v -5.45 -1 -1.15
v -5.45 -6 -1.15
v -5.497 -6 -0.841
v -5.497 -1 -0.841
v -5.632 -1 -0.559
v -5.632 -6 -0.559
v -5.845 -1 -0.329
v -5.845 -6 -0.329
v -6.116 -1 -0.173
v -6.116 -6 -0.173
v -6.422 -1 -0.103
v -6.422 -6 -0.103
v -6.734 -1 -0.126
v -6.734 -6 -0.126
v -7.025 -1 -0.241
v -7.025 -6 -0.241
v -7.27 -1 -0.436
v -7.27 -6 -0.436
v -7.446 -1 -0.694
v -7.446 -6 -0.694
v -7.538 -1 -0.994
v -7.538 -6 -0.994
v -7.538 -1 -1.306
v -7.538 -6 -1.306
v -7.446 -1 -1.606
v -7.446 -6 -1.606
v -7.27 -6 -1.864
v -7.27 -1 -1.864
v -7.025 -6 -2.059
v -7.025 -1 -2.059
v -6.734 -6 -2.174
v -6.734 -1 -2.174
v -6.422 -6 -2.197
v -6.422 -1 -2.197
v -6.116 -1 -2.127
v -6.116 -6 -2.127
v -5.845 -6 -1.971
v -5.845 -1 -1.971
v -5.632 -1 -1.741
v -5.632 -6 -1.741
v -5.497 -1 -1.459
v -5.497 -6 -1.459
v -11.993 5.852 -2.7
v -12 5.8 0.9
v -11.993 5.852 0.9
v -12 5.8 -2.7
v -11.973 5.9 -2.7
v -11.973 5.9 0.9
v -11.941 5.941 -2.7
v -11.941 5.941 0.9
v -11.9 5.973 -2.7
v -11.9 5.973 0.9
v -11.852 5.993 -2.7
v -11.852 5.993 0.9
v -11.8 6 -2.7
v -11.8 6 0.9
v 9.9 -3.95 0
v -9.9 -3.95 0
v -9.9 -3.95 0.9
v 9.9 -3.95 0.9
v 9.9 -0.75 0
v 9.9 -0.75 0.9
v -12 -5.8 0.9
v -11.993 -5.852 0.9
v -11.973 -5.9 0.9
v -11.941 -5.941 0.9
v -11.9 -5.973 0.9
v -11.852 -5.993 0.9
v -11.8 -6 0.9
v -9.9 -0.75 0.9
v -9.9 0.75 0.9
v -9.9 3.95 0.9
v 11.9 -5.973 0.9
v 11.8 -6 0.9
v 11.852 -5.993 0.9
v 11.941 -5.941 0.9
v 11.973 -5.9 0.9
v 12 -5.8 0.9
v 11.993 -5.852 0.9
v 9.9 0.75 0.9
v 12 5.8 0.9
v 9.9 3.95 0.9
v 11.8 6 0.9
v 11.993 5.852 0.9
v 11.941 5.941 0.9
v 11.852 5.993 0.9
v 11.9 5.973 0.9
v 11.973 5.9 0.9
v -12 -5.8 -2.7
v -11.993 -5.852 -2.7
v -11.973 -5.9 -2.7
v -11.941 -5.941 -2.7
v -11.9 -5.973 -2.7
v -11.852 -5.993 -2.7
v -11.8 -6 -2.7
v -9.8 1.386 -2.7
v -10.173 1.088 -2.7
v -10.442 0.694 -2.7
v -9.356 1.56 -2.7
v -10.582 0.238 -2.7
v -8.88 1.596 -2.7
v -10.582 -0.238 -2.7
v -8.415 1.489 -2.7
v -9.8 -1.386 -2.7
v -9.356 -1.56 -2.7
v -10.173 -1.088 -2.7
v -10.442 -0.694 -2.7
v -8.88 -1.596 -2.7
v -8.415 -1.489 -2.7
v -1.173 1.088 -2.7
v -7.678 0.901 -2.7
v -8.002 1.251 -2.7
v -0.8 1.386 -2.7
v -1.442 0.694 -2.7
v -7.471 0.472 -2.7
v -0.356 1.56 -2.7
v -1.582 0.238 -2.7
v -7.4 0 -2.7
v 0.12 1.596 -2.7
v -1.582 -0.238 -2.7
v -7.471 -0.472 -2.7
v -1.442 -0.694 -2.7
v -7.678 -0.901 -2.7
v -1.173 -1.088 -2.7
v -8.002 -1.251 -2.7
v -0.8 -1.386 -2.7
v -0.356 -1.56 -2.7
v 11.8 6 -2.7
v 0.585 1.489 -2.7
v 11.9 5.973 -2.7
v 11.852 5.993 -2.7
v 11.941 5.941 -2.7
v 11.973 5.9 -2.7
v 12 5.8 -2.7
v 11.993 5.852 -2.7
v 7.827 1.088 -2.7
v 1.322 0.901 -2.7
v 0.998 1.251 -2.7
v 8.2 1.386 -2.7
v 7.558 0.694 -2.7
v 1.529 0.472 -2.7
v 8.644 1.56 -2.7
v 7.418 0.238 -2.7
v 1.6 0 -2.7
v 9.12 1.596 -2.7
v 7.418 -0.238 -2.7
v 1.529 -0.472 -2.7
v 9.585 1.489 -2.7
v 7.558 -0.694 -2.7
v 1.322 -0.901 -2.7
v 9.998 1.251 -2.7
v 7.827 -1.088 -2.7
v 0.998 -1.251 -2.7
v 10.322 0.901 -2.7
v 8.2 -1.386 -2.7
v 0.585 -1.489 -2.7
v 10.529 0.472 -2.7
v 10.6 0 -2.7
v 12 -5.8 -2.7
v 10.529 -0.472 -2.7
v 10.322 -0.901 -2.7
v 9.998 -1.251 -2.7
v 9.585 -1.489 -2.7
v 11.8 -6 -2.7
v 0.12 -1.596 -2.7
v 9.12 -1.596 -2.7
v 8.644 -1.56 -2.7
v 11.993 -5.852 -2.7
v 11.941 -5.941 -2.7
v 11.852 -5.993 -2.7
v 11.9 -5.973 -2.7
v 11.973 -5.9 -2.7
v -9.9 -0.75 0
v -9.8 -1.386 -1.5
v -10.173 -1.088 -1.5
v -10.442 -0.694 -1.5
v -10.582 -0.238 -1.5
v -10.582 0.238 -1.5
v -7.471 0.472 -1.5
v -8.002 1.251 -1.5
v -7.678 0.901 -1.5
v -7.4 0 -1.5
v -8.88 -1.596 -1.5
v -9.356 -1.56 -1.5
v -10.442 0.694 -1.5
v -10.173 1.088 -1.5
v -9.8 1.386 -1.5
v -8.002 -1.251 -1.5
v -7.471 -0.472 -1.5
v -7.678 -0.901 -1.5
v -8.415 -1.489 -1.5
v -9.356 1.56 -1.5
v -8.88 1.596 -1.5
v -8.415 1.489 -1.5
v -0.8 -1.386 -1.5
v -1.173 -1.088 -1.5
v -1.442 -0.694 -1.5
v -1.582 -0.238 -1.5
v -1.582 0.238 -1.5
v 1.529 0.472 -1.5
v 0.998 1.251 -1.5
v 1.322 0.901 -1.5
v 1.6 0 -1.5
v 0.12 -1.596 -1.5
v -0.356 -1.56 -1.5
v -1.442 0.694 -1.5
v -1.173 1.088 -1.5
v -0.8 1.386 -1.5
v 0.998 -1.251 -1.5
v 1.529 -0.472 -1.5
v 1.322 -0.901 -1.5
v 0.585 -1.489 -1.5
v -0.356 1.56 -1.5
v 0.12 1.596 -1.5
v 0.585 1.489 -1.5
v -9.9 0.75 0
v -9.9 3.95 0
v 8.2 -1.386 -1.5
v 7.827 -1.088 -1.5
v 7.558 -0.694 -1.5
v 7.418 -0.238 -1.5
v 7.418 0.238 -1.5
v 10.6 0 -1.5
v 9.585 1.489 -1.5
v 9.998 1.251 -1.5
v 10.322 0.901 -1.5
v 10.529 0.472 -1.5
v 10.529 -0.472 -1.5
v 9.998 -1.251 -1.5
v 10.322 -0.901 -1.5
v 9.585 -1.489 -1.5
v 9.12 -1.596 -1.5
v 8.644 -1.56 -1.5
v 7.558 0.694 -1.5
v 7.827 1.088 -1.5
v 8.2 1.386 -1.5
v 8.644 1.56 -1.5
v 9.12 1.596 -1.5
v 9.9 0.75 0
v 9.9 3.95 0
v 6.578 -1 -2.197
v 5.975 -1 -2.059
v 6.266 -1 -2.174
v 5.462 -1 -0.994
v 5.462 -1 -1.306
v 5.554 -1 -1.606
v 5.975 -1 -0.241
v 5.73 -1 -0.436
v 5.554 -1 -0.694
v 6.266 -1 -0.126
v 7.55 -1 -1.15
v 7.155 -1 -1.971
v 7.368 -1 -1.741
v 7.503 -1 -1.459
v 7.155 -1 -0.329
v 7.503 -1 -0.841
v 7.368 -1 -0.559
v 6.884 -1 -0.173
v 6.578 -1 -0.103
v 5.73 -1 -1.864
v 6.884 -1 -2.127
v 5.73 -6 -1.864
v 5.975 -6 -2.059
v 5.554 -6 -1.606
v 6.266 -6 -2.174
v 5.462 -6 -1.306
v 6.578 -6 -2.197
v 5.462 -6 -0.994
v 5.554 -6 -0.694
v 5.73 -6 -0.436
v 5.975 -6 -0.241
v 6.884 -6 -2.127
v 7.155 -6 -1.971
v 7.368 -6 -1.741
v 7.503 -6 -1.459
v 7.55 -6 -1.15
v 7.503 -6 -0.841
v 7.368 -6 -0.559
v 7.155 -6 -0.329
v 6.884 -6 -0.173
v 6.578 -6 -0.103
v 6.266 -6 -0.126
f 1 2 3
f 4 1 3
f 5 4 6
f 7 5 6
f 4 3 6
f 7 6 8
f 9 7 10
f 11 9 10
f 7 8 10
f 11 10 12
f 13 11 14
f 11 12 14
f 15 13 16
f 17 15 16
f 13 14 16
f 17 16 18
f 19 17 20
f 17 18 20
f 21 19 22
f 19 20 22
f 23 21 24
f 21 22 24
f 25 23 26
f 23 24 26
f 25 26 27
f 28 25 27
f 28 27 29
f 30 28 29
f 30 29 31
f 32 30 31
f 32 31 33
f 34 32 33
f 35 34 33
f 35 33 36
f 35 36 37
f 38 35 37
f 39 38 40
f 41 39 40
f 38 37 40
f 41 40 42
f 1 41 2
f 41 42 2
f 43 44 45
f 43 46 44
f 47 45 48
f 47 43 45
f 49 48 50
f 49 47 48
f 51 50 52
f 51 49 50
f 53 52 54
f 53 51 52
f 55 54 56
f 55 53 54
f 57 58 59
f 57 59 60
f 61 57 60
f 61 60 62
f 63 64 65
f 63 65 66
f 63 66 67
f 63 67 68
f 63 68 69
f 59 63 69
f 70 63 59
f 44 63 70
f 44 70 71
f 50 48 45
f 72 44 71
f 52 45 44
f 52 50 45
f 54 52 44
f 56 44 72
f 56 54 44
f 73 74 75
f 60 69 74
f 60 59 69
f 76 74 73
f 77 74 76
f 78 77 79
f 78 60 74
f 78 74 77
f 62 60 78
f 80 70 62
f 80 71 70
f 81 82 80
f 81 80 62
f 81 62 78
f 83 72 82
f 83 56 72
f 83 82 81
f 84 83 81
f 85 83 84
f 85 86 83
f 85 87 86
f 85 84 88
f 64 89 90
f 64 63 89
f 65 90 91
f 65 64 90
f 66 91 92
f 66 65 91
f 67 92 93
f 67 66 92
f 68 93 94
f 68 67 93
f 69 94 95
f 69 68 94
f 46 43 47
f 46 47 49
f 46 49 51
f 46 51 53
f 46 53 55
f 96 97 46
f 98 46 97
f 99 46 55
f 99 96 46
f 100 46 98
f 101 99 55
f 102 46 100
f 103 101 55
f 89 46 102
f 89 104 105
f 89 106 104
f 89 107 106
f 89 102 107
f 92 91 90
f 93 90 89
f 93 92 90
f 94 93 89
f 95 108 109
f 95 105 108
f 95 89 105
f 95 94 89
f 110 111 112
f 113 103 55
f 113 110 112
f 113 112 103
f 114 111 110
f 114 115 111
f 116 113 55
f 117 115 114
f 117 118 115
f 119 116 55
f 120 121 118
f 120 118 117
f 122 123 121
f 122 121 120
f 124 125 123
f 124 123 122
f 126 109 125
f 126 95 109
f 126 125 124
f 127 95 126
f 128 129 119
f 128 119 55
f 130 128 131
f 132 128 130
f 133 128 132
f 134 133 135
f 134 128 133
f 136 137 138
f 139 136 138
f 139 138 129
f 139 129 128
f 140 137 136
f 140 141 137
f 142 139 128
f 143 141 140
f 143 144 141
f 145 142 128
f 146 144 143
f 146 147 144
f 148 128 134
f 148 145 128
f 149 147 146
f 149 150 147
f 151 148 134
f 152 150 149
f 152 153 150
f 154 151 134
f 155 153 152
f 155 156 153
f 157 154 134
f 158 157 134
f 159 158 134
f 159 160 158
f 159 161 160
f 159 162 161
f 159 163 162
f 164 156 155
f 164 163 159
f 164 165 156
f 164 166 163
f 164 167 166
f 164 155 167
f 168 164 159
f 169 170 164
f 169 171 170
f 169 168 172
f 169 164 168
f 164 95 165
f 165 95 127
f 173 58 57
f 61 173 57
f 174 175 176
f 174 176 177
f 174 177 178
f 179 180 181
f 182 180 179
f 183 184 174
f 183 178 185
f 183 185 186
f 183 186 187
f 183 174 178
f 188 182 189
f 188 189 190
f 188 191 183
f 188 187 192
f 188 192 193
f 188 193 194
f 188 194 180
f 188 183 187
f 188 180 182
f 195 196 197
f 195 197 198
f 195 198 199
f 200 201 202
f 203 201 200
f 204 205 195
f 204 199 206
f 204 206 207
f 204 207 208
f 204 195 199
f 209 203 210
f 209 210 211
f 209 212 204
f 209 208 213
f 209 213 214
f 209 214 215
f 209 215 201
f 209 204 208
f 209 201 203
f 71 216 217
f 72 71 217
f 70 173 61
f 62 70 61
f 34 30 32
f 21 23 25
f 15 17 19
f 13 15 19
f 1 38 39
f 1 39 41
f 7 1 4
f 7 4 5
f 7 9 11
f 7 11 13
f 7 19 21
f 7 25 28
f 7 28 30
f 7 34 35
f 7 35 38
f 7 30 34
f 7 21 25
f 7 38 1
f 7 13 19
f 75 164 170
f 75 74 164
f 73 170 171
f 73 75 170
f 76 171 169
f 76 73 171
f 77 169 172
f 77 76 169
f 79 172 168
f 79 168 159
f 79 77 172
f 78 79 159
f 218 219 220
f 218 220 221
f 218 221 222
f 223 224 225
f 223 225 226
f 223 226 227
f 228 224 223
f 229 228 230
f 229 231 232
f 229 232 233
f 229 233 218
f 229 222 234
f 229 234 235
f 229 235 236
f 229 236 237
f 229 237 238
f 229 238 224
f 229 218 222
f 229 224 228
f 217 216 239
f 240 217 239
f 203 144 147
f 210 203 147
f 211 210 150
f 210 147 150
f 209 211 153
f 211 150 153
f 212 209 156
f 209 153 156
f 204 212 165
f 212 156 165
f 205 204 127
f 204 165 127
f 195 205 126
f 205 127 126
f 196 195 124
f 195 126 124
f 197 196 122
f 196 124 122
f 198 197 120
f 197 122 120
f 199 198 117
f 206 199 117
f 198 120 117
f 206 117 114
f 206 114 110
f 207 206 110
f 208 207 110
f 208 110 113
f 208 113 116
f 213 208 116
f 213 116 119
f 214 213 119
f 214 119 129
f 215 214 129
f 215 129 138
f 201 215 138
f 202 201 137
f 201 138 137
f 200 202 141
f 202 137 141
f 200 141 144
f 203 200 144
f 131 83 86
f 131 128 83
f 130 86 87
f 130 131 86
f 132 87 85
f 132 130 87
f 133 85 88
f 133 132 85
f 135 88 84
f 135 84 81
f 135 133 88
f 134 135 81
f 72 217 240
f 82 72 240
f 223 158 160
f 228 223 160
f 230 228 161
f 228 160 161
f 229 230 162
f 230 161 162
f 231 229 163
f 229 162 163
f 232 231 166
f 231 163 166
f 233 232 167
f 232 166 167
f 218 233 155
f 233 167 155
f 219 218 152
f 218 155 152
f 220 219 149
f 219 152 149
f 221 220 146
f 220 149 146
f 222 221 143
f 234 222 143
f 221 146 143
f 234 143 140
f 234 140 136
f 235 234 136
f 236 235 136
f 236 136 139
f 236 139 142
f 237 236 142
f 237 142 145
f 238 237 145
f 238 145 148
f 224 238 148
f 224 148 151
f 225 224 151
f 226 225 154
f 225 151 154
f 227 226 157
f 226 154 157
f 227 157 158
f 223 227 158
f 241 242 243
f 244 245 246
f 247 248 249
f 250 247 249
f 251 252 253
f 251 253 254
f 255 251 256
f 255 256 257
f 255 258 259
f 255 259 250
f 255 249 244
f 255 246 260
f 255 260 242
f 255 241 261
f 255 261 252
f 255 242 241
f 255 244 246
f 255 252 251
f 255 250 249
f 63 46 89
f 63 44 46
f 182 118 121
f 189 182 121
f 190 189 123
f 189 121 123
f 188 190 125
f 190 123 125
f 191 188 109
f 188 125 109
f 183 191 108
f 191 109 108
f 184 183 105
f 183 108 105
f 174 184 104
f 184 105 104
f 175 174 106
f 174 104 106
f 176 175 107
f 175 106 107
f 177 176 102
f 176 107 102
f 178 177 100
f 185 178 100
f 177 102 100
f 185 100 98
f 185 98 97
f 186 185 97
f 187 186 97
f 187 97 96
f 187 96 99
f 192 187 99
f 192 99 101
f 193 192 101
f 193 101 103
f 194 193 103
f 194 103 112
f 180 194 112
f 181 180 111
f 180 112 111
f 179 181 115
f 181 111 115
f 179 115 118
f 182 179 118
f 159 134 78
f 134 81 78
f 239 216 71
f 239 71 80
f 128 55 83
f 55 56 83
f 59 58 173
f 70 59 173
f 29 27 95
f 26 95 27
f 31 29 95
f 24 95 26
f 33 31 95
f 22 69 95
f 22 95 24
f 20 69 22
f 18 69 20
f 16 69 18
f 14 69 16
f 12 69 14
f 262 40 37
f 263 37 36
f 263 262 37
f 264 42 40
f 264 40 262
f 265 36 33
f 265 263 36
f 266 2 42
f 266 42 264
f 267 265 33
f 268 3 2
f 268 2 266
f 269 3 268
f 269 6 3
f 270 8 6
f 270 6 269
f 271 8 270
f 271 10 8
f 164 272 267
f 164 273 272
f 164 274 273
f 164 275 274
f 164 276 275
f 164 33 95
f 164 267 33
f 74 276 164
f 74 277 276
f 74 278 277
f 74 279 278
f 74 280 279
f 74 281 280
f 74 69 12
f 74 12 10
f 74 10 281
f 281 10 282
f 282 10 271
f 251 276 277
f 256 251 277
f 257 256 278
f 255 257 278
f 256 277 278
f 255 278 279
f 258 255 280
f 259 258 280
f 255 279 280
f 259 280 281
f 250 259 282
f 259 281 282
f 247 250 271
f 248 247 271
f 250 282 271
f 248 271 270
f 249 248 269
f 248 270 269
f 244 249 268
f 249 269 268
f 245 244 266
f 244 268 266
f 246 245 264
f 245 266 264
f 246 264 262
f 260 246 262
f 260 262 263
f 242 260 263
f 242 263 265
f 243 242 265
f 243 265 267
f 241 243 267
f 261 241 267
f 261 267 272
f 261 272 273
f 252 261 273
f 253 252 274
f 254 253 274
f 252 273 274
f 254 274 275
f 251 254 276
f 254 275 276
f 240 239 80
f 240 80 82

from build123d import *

# Parameters (mm, degrees)
F0_W     = 24
F0_H     = 12
F0_W_2   = 19.8
F0_H_2   = 3.2
F1_DEPTH = 0.9
F2_W     = 24
F2_H     = 12
F3_DEPTH = 2.7
F4_R     = 1.6
F5_DEPTH = 1.2
F6_R     = 0.2
F7_R     = 1.05
F8_DEPTH = 5


with BuildPart() as f1:
    # F0 (on Top) → F1 (new body)
    with BuildSketch(Plane.XY):
        Rectangle(F0_W, F0_H)
        with Locations((0, -2.35)):
            Rectangle(F0_W_2, F0_H_2, mode=Mode.SUBTRACT)
        with Locations((0, 2.35)):
            Rectangle(F0_W_2, F0_H_2, mode=Mode.SUBTRACT)
    extrude(amount=F1_DEPTH)

    # F2 (on face) → F3 (join)
    with BuildSketch(Plane(origin=(0, 0, 0), x_dir=(1, 0, 0), z_dir=(0, 0, -1))):
        Rectangle(F2_W, F2_H)
    extrude(amount=F3_DEPTH)

    # F4 (on face) → F5 (cut)
    with BuildSketch(Plane(origin=(0, 0, -2.7), x_dir=(1, 0, 0), z_dir=(0, 0, -1))):
        Circle(F4_R)
        with Locations((-9, 0)):
            Circle(F4_R)
        with Locations((9, 0)):
            Circle(F4_R)
    extrude(amount=-F5_DEPTH, mode=Mode.SUBTRACT)

    # F6
    f6_edges = [f1.edges().sort_by_distance(p)[0] for p in [
        (-12, -6, -0.9),
        (-12, 6, -0.9),
        (12, 6, -0.9),
        (12, -6, -0.9),
    ]]
    fillet(f6_edges, radius=F6_R)

    # F7 (on face) → F8 (cut)
    with BuildSketch(Plane.XZ.offset(6)):
        with Locations((-6.5, -1.15)):
            Circle(F7_R)
        with Locations((6.5, -1.15)):
            Circle(F7_R)
    extrude(amount=-F8_DEPTH, mode=Mode.SUBTRACT)


solid = f1.part
